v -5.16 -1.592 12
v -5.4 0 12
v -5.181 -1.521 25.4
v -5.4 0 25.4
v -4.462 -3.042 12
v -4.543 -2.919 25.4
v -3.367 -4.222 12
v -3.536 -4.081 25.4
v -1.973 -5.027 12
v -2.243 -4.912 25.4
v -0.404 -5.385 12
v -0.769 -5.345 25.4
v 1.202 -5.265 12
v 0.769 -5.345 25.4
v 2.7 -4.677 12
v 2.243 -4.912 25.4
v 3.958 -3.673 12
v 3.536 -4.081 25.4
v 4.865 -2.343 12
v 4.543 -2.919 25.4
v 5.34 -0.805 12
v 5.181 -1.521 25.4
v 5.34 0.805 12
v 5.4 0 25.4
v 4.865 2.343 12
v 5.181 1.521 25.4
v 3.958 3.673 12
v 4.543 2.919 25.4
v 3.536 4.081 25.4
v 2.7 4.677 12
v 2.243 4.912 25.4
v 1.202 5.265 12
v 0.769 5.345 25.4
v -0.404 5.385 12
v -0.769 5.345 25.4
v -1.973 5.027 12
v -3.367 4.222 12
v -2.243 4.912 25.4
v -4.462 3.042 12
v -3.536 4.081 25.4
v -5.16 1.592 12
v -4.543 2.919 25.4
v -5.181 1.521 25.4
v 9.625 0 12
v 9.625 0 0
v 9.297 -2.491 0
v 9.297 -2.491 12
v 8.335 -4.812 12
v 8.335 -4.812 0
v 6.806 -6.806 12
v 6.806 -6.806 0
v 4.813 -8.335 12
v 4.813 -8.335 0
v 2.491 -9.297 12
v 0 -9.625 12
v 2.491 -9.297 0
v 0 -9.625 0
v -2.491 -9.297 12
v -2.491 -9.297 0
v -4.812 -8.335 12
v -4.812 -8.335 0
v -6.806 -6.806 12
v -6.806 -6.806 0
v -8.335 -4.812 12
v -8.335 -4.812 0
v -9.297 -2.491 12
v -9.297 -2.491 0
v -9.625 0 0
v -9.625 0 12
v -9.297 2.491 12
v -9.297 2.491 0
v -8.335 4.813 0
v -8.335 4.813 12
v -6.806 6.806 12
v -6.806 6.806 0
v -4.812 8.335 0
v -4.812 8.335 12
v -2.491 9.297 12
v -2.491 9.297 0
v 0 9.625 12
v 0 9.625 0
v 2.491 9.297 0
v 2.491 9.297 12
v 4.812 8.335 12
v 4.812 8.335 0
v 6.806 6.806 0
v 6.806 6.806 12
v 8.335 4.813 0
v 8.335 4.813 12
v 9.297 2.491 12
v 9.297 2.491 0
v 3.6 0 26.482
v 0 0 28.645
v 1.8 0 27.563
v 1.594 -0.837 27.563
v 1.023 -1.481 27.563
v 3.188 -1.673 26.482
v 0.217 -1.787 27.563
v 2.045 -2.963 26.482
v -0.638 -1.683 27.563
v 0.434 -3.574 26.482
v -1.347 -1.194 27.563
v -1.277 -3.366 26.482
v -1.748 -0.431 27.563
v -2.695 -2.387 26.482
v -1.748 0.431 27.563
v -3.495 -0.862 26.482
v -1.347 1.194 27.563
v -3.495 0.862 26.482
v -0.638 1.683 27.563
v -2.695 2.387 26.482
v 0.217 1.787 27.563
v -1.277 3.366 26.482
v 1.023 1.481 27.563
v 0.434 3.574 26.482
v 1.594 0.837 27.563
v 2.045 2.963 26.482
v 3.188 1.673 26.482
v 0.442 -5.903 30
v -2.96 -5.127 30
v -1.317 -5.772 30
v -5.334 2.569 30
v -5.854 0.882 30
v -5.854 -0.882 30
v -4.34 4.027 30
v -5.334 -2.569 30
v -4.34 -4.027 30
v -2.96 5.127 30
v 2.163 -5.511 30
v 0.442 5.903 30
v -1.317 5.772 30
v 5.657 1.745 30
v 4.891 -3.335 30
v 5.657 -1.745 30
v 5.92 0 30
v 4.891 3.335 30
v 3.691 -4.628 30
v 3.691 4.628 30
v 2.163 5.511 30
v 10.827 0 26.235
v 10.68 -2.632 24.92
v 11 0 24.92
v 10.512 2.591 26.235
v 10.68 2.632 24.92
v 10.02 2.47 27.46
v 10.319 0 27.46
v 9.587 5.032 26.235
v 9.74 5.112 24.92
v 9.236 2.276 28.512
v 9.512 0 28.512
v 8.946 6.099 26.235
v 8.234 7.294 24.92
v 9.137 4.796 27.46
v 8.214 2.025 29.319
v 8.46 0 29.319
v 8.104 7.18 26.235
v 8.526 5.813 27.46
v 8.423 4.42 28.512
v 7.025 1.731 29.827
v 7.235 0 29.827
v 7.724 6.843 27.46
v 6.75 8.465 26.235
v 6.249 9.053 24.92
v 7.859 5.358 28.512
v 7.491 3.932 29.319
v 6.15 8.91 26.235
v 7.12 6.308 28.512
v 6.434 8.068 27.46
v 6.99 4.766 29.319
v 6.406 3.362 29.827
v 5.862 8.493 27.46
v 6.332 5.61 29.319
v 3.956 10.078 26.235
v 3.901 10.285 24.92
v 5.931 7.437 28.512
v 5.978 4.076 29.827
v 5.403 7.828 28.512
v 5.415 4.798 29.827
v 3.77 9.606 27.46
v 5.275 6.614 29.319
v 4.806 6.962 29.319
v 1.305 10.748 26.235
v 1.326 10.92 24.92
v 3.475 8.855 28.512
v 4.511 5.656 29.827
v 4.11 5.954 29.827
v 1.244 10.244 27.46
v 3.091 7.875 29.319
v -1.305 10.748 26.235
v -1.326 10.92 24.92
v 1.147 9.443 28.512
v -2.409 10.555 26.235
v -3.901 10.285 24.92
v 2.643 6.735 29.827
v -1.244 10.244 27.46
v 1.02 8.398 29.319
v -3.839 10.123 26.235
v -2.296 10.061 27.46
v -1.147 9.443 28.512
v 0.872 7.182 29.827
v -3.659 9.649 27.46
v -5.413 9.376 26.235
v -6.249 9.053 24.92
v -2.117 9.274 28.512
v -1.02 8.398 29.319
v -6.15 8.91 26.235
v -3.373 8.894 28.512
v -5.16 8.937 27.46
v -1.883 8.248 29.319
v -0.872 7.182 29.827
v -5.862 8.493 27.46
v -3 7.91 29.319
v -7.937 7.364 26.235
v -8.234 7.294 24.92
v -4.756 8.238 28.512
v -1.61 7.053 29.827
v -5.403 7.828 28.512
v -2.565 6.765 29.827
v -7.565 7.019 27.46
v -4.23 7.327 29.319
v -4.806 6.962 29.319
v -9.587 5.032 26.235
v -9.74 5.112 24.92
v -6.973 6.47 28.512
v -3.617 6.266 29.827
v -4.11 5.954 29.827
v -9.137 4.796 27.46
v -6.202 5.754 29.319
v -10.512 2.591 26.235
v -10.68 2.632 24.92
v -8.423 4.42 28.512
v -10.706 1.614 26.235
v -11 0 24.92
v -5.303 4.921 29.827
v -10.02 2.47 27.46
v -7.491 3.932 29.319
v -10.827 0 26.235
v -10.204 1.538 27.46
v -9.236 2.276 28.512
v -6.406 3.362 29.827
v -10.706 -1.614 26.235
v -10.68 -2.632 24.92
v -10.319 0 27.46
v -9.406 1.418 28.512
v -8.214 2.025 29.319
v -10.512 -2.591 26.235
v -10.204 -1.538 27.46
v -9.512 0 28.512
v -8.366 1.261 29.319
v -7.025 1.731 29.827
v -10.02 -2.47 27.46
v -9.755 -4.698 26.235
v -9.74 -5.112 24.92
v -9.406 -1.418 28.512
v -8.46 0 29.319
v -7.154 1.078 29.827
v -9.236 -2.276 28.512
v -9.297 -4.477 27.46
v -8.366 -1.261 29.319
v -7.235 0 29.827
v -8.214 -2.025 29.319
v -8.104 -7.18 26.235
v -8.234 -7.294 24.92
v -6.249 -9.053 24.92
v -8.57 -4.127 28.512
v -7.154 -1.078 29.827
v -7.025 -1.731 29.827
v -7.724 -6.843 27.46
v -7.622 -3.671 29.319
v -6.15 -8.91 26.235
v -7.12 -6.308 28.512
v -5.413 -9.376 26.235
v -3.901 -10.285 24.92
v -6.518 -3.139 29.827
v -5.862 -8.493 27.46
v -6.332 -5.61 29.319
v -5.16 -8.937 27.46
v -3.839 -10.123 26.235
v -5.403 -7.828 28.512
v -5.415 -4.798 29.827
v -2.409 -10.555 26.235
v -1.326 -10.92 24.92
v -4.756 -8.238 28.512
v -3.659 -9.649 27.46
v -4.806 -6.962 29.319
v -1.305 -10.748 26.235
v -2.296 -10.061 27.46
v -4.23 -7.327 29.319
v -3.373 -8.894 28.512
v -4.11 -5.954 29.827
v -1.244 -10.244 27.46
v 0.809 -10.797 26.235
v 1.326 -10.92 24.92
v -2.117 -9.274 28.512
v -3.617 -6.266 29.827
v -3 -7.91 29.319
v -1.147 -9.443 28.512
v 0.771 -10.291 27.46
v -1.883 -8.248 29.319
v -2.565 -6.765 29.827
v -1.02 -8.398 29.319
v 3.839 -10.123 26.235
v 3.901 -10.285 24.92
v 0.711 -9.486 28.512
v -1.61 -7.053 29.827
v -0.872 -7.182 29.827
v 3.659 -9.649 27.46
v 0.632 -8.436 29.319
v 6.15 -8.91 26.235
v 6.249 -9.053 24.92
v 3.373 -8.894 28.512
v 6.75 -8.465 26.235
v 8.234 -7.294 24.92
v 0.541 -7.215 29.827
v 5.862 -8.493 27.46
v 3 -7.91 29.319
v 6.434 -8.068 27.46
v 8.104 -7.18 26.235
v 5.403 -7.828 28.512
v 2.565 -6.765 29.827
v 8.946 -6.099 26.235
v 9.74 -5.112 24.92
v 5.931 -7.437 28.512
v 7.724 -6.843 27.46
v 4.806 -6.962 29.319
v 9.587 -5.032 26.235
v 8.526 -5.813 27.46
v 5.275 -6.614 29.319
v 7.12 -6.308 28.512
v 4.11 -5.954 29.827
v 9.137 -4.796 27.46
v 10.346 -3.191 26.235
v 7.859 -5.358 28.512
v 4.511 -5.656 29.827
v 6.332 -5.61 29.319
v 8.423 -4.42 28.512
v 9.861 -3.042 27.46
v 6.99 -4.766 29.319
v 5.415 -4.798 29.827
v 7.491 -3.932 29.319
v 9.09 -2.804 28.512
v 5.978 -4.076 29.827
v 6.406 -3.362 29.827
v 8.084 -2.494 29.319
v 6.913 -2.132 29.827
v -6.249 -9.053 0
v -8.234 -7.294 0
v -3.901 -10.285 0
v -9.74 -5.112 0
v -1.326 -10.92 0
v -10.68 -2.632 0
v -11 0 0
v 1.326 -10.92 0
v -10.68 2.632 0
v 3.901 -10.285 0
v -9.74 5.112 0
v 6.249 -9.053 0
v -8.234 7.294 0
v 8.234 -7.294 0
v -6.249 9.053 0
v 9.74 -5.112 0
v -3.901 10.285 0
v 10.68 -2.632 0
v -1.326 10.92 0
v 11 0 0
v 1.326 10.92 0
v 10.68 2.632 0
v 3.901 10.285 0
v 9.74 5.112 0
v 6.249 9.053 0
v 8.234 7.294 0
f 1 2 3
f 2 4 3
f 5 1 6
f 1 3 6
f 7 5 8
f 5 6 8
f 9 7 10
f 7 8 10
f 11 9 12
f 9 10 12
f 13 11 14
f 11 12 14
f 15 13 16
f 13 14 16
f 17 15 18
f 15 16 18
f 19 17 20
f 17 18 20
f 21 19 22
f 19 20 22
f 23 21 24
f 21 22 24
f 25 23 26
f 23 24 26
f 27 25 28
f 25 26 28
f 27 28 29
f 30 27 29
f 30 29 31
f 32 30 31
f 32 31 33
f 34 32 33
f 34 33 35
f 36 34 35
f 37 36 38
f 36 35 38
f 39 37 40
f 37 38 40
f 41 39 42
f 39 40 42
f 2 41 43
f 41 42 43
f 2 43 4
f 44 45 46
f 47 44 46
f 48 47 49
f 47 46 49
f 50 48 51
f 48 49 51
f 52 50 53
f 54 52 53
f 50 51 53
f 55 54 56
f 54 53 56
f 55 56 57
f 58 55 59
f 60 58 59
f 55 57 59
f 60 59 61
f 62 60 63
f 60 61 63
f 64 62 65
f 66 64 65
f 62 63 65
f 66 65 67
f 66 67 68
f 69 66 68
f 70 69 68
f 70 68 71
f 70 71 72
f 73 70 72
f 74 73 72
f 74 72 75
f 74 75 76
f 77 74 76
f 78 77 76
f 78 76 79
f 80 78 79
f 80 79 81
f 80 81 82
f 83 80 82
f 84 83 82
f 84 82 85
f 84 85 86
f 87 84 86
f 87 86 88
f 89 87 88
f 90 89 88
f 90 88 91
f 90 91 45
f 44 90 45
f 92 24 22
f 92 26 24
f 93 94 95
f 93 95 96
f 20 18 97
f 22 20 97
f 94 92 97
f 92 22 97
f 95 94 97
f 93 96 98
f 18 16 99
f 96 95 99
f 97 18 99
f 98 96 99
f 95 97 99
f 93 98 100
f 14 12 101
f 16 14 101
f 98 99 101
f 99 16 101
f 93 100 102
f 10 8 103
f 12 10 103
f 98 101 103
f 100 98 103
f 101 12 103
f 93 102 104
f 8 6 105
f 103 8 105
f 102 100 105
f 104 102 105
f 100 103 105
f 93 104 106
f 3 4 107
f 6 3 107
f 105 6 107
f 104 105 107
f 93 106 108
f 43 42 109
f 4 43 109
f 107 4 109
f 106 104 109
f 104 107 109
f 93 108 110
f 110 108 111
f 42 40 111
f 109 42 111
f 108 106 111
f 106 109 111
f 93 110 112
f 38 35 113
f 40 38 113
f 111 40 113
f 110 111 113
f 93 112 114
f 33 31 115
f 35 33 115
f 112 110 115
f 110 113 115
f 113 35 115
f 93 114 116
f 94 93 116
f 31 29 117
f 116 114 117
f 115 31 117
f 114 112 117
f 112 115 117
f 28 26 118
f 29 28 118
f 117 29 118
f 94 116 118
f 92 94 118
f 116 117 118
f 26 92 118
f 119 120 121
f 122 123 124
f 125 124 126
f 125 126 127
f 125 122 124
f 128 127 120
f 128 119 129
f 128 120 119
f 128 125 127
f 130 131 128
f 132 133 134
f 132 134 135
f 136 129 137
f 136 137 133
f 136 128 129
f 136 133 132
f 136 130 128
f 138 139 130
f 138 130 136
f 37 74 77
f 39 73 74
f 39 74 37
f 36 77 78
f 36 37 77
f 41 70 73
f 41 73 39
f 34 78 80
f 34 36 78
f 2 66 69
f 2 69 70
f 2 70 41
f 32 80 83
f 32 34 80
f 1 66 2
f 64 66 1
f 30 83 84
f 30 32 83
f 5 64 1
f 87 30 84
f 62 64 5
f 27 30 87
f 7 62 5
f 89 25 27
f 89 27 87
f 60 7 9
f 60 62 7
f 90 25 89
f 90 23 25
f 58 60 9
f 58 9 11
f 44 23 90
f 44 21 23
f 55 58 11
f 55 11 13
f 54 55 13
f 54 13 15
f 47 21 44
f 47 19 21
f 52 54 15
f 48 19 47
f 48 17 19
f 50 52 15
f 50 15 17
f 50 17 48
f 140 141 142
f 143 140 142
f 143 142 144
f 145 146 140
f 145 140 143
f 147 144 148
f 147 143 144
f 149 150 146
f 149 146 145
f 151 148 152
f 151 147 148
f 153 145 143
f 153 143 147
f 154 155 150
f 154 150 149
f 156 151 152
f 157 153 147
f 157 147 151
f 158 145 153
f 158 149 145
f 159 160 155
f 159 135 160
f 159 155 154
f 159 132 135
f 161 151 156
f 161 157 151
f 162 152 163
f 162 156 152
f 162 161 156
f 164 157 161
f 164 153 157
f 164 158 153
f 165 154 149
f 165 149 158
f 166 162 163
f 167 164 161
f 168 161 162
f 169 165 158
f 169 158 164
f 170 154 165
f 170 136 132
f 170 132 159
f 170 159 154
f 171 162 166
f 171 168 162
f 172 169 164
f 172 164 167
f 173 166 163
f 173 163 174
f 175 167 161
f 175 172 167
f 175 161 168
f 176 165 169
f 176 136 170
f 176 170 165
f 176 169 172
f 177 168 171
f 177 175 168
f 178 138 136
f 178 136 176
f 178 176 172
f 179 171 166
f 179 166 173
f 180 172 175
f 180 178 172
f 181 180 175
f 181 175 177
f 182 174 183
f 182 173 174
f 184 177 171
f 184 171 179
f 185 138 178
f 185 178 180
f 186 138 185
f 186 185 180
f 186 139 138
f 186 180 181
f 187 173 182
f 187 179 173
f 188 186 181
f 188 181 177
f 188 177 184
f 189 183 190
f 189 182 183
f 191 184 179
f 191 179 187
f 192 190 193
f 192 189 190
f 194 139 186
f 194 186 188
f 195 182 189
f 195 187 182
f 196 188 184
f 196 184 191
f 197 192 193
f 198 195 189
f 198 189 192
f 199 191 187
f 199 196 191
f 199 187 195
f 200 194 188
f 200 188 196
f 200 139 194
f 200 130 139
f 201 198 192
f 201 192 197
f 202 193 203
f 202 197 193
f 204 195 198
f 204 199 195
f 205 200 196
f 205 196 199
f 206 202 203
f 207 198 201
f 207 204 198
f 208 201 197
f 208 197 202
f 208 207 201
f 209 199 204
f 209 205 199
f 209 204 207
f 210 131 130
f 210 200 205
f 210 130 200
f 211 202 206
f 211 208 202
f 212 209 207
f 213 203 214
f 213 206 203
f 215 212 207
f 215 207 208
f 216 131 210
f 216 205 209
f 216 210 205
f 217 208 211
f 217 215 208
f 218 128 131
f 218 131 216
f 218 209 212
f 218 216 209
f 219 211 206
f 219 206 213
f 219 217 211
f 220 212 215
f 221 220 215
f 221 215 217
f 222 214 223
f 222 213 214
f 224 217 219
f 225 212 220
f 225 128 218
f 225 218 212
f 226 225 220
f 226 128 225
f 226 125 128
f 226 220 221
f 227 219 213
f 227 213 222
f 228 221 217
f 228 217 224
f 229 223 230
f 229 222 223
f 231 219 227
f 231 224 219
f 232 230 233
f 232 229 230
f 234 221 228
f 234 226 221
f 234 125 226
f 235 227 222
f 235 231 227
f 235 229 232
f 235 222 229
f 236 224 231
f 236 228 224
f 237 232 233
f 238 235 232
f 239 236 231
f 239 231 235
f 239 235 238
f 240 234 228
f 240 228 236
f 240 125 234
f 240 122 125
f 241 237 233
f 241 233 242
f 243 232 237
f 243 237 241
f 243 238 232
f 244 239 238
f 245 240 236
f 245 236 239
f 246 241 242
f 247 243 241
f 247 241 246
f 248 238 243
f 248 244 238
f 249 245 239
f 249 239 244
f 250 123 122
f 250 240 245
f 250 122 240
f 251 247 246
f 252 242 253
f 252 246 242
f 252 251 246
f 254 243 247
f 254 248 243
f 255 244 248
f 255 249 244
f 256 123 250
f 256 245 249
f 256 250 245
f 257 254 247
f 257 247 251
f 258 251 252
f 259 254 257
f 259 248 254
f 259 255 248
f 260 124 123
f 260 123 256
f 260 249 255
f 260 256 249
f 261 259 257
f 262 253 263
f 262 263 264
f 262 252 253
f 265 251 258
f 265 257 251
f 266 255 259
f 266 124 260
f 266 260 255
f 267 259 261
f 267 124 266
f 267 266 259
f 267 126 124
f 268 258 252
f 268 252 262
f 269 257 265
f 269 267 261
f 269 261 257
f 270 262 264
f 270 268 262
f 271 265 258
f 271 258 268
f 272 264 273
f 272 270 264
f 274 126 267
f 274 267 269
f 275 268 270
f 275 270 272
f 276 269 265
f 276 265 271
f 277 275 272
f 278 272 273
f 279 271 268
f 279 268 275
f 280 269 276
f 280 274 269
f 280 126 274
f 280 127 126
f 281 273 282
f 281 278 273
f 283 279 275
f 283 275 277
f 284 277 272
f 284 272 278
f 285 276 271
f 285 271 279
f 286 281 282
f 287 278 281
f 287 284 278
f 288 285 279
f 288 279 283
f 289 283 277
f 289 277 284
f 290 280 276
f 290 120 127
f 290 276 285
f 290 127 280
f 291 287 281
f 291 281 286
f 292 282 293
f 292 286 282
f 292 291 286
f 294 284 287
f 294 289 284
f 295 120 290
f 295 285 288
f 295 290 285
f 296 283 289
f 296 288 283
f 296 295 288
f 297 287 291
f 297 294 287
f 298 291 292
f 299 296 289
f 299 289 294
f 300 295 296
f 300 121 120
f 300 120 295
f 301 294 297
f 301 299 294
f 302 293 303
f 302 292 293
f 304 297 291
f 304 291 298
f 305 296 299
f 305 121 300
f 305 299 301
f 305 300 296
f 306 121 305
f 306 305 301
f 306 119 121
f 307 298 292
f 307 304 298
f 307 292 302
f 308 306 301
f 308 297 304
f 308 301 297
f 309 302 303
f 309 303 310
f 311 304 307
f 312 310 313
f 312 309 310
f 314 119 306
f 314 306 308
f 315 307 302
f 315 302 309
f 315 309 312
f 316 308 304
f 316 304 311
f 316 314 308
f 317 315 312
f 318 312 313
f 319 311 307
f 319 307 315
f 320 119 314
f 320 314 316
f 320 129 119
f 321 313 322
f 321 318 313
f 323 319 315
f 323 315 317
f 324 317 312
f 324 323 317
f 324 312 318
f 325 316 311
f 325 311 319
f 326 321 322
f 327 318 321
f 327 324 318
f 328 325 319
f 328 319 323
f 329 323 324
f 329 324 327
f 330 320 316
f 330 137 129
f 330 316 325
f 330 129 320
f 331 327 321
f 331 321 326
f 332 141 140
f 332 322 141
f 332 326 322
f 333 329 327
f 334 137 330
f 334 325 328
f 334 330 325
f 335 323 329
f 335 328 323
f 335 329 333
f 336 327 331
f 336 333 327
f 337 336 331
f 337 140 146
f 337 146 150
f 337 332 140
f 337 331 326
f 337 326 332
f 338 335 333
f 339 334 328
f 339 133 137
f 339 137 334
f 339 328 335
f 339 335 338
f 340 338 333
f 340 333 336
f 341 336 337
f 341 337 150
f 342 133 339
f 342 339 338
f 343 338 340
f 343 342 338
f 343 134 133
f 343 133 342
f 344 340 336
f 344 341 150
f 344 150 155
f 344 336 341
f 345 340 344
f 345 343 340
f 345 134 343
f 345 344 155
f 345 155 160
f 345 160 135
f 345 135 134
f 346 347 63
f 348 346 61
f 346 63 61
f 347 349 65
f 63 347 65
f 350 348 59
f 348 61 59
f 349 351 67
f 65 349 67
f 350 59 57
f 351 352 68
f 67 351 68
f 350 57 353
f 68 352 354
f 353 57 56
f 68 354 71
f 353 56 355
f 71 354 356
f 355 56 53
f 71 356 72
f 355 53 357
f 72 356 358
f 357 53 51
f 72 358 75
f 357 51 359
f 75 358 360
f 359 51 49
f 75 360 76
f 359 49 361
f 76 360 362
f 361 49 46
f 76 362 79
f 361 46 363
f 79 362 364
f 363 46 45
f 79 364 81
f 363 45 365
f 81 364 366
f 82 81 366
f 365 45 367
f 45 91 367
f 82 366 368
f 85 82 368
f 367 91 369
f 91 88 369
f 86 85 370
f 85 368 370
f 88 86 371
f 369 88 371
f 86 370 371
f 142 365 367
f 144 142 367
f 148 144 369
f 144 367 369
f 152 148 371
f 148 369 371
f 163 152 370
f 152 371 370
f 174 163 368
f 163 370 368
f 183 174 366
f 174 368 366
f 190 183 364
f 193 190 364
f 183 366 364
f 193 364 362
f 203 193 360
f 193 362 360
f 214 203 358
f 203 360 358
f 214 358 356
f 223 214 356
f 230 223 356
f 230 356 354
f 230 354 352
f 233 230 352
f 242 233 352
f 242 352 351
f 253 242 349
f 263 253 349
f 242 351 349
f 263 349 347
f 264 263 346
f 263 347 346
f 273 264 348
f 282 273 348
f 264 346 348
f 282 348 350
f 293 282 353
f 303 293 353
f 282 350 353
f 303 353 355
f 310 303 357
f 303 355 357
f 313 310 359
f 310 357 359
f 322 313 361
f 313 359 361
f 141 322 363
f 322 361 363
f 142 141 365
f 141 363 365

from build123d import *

# Parameters (mm, degrees)
F0_R           = 11
F1_DEPTH       = 30
F2_D           = 10.8
F2_DEPTH       = 25.4
F2_CBORE_D     = 19.25
F2_CBORE_DEPTH = 12
F2_TIP         = 3.2446473427
F3_R           = 5.08


with BuildPart() as f1:
    # F0 (on Top) → F1 (new body)
    with BuildSketch(Plane.XY):
        Circle(F0_R)
    extrude(amount=F1_DEPTH)

    # F2
    with Locations(Plane(origin=(0, 0, 0), x_dir=(1, 0, 0), z_dir=(0, 0, -1))):
        with Locations((0, 0)):
            CounterBoreHole(F2_D / 2, F2_CBORE_D / 2, F2_CBORE_DEPTH, depth=F2_DEPTH)
            with Locations((0, 0, -(F2_DEPTH + F2_TIP / 2))):  # 118° drill point
                Cone(0, F2_D / 2, F2_TIP, mode=Mode.SUBTRACT)

    # F3
    f3_edges = [f1.edges().sort_by_distance(p)[0] for p in [
        (-11, 0, 30),
    ]]
    fillet(f3_edges, radius=F3_R)


solid = f1.part
